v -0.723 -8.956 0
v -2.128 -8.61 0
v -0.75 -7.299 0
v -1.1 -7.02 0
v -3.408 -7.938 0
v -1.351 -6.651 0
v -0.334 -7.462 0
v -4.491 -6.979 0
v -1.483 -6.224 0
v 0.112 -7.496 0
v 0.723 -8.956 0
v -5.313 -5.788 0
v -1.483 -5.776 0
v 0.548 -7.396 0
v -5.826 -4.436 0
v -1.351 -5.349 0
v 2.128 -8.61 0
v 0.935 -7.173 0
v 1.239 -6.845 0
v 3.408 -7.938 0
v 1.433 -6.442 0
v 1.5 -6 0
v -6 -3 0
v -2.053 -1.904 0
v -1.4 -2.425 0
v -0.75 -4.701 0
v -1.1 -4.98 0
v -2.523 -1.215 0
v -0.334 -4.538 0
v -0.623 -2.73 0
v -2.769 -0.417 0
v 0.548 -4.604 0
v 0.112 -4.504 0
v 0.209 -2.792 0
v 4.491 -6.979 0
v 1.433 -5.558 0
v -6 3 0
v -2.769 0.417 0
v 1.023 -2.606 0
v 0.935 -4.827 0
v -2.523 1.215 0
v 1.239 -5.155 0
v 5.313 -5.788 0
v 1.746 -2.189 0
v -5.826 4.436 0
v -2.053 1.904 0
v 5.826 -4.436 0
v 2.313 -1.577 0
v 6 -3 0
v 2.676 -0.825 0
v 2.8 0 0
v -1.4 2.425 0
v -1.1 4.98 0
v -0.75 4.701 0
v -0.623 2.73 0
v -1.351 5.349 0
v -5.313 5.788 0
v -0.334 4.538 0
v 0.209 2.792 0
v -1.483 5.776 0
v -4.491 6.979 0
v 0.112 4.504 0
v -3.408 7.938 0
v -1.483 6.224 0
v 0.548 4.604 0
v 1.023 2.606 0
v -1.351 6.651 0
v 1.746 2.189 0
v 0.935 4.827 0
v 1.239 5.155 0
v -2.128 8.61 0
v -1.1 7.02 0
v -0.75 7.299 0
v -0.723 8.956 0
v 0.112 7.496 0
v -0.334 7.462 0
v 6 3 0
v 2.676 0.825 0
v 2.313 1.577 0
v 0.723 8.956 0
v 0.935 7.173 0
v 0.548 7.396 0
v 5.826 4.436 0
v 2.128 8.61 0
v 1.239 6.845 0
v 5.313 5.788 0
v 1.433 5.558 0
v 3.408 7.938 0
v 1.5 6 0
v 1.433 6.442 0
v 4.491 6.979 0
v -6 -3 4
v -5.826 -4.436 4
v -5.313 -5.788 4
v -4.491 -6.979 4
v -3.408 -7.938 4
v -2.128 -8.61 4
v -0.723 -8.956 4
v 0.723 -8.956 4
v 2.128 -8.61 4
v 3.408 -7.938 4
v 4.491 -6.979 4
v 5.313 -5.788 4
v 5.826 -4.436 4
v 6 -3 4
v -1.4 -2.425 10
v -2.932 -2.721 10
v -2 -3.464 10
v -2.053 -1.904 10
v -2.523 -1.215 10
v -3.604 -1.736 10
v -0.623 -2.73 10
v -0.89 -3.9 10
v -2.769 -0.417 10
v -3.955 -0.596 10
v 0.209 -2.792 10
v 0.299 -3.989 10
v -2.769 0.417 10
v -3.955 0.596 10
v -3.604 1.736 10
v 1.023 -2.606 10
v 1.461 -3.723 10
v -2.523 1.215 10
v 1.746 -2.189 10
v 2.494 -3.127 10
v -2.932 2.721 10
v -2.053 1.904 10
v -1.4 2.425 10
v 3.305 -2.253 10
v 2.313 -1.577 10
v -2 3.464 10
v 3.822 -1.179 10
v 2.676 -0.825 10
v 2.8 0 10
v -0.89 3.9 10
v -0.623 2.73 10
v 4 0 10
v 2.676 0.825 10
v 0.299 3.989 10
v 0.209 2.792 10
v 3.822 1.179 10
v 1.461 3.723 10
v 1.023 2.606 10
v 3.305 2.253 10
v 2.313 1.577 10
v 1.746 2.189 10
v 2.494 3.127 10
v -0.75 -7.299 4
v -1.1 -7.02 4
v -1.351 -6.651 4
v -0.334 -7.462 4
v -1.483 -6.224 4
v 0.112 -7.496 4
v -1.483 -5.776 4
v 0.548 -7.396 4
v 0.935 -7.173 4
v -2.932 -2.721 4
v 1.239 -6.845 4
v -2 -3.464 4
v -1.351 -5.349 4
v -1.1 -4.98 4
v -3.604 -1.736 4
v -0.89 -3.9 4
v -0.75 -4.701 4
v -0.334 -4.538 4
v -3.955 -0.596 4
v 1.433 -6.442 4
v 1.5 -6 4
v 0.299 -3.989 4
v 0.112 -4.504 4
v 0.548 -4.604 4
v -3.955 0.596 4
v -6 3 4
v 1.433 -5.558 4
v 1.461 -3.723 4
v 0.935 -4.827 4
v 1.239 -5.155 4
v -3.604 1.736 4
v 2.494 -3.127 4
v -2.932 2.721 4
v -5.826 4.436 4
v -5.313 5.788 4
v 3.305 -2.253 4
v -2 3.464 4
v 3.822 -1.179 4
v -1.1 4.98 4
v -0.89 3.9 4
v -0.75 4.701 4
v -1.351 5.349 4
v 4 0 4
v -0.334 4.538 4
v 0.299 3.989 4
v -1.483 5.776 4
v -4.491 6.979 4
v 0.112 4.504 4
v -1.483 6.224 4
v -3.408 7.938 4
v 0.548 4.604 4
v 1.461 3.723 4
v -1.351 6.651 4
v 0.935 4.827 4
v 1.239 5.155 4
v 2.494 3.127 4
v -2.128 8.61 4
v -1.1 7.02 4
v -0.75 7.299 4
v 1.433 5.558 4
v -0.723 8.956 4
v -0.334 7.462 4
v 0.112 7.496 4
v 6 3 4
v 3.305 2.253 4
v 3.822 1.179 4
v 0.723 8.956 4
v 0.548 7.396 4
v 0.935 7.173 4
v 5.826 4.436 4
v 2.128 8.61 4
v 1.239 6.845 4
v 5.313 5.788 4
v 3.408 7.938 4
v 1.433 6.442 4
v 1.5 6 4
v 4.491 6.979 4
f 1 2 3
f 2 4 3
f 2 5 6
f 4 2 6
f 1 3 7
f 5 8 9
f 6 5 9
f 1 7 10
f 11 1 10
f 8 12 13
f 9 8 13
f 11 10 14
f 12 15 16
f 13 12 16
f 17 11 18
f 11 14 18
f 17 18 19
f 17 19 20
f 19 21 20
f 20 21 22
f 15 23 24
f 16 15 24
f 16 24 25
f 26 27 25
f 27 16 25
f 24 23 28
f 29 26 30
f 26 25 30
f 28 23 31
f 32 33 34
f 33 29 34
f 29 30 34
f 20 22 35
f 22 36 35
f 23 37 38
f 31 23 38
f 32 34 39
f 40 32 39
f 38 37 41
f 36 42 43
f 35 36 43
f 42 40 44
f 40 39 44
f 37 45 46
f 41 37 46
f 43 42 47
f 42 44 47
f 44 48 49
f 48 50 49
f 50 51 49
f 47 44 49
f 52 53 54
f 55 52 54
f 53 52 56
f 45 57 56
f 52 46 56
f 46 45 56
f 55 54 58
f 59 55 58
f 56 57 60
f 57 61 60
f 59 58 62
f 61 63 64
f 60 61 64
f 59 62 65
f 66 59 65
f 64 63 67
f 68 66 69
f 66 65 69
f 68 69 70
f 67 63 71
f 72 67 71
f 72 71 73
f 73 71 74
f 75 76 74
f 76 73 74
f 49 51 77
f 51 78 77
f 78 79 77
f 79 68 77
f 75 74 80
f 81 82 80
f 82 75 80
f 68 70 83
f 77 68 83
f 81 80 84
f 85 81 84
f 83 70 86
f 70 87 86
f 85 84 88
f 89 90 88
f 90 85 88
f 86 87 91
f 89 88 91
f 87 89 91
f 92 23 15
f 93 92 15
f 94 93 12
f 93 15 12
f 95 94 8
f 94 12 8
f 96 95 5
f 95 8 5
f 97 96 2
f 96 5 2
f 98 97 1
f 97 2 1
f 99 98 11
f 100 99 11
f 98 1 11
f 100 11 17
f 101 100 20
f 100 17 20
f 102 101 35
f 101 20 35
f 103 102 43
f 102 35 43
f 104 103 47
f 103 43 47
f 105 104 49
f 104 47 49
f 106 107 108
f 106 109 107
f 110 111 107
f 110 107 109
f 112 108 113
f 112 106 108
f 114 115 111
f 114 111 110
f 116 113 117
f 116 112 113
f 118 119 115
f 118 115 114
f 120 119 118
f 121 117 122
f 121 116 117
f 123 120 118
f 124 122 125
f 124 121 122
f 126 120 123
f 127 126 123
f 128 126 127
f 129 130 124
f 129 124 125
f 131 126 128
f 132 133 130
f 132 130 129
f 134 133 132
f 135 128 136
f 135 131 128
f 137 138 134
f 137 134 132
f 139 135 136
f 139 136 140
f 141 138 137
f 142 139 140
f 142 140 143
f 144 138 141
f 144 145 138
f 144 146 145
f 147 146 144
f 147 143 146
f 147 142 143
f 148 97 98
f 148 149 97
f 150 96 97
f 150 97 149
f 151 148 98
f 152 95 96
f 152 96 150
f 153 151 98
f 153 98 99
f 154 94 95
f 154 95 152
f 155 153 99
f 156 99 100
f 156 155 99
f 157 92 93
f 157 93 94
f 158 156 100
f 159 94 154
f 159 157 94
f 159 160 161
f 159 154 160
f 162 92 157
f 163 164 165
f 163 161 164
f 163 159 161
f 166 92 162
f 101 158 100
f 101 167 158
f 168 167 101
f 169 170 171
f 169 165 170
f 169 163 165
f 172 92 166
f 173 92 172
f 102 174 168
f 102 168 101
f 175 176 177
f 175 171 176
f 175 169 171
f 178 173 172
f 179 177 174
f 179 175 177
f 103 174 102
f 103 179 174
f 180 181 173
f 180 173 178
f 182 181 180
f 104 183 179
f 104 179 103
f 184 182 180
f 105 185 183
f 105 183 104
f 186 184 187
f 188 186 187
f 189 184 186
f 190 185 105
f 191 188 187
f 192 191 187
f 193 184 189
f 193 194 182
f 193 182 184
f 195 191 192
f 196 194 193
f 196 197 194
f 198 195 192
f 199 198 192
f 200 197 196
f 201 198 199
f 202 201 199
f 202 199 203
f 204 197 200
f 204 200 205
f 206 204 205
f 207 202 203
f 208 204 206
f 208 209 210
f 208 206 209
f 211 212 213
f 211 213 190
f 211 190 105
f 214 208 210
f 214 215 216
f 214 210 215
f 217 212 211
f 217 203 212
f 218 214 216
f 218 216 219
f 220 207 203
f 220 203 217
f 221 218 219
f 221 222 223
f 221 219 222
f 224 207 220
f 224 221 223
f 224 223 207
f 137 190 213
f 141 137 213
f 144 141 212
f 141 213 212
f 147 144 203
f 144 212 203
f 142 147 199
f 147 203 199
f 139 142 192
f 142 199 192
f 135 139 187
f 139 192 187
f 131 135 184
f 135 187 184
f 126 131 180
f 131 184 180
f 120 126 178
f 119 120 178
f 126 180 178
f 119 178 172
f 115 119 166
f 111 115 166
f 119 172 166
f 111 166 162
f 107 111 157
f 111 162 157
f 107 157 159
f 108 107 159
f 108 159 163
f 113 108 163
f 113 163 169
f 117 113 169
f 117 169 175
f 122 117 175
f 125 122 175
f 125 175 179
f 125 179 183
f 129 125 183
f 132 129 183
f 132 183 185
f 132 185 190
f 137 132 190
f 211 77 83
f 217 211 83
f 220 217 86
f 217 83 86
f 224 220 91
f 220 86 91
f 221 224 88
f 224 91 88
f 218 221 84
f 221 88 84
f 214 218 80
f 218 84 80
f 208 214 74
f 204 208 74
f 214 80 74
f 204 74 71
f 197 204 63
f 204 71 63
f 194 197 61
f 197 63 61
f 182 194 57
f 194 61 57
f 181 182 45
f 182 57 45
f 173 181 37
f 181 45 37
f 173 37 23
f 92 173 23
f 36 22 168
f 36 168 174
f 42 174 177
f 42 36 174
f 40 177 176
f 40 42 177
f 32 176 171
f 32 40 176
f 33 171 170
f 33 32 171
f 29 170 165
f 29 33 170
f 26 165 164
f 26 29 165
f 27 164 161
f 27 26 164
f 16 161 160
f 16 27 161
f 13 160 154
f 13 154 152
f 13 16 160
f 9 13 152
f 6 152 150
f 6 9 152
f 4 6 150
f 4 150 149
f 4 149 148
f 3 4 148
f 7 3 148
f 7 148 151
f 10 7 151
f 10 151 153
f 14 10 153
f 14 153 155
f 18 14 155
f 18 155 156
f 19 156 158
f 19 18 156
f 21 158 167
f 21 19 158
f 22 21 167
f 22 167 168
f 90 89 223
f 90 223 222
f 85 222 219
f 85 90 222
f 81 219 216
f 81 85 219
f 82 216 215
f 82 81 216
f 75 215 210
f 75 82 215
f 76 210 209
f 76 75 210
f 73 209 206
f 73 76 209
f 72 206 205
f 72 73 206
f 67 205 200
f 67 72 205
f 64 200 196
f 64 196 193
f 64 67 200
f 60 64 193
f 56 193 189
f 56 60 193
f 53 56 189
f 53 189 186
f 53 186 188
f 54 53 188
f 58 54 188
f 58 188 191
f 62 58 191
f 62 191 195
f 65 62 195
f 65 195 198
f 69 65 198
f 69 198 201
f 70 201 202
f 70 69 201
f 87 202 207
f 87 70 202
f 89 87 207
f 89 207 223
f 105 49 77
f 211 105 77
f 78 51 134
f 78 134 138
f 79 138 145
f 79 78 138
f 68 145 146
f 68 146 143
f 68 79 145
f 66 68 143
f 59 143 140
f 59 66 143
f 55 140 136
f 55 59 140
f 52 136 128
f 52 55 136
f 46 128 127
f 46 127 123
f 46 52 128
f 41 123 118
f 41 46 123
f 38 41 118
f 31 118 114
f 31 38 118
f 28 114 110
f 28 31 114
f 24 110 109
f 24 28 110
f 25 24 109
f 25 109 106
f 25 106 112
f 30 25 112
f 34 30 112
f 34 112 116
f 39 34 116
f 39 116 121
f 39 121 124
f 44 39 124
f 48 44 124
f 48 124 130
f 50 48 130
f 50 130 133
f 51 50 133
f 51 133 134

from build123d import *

# Parameters (mm, degrees)
SKETCH3_R           = 1.5
SKETCH3_R_2         = 2.8
BOSS_EXTRUDE1_DEPTH = 4
SKETCH3_3_R         = 4
SKETCH3_3_R_2       = 2.8
BOSS_EXTRUDE2_DEPTH = 10


with BuildPart() as part:
    # Sketch3 → Boss-Extrude1 (new body)
    with BuildSketch(Plane.XY):
        with BuildLine():
            ThreePointArc((-6, -3), (0, -9), (6, -3))
            Line((6, -3), (6, 3))
            ThreePointArc((6, 3), (0, 9), (-6, 3))
            Line((-6, 3), (-6, -3))
        make_face()
        with Locations((0, -6)):
            Circle(SKETCH3_R, mode=Mode.SUBTRACT)
        with Locations((0, 6)):
            Circle(SKETCH3_R, mode=Mode.SUBTRACT)
        Circle(SKETCH3_R_2, mode=Mode.SUBTRACT)
    extrude(amount=BOSS_EXTRUDE1_DEPTH)

    # Sketch3<3> → Boss-Extrude2 (add)
    with BuildSketch(Plane.XY):
        Circle(SKETCH3_3_R)
        Circle(SKETCH3_3_R_2, mode=Mode.SUBTRACT)
    extrude(amount=BOSS_EXTRUDE2_DEPTH)


solid = part.part
